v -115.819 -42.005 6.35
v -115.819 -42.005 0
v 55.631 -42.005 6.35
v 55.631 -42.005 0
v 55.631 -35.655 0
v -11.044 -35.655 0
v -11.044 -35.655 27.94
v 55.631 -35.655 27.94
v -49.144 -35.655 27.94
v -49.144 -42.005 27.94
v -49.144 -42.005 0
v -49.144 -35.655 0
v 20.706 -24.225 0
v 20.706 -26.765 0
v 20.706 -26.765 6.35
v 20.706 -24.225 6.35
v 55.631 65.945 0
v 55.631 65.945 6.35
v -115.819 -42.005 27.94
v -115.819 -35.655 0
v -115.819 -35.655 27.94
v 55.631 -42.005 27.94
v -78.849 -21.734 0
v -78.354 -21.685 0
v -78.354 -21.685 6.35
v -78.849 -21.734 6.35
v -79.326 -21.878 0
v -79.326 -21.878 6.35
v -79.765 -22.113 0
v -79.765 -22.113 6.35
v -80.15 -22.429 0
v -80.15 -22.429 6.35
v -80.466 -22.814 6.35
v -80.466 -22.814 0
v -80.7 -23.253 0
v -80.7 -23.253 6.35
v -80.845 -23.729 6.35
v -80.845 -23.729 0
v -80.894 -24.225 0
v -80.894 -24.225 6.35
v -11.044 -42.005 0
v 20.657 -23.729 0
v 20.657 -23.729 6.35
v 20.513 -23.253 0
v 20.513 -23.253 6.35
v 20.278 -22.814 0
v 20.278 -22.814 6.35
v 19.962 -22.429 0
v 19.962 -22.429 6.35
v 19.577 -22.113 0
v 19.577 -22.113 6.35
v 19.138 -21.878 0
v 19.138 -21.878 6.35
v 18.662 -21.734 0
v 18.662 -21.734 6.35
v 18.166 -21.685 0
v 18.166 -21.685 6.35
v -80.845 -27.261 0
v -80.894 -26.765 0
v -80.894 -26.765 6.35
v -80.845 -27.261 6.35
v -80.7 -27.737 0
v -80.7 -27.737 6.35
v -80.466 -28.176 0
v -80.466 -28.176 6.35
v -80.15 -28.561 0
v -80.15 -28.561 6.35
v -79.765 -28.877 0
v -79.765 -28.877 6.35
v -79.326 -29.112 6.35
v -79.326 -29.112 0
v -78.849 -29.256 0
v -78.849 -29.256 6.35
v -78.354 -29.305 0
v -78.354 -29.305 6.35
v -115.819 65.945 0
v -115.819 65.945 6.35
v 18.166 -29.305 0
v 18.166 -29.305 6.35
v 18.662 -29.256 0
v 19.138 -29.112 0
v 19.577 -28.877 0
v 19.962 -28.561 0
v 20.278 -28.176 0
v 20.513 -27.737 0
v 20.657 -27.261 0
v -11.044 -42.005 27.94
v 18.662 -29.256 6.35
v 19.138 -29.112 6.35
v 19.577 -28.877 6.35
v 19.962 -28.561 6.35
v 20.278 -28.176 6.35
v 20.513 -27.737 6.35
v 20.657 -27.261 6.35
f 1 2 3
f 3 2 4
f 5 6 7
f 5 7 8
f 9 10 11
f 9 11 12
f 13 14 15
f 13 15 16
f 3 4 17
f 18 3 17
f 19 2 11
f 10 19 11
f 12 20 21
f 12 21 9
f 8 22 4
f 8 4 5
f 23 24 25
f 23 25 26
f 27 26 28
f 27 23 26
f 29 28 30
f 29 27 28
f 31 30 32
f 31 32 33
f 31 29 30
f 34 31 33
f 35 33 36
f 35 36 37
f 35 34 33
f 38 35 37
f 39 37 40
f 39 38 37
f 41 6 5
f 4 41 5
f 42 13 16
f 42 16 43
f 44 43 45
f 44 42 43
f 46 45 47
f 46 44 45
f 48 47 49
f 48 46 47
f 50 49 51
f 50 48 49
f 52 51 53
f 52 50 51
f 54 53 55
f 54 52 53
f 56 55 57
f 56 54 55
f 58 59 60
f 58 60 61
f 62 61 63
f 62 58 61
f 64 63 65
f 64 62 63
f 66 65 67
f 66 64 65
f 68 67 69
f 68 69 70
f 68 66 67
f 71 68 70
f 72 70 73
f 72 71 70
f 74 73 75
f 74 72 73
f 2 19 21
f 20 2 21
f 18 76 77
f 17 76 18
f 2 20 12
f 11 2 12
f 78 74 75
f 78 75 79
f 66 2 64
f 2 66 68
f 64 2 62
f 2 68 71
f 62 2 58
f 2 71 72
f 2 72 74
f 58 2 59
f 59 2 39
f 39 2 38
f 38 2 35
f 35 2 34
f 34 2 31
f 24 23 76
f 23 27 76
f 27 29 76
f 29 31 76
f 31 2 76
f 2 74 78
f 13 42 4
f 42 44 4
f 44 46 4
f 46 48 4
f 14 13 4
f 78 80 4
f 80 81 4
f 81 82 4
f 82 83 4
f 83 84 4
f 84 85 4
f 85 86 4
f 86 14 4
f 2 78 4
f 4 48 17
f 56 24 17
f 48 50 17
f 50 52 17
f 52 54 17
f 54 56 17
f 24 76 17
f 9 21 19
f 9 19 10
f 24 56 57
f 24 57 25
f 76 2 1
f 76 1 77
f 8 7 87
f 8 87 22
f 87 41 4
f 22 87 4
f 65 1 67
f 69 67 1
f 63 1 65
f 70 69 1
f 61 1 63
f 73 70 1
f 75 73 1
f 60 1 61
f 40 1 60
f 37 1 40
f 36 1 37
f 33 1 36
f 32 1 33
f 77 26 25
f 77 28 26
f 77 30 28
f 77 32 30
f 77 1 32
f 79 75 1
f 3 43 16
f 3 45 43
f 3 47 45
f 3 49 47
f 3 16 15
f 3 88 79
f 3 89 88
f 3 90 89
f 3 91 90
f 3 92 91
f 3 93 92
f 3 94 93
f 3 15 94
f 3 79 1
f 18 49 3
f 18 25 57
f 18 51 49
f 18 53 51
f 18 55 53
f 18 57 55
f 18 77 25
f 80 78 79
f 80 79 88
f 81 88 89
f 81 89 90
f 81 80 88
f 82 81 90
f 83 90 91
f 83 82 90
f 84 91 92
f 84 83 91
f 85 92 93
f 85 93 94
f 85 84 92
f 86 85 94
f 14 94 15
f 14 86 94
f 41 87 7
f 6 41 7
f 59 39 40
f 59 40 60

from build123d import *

# Parameters (mm, degrees)
F2_W     = 66.675
F2_H     = 6.35
F3_DEPTH = 27.94
F0_W     = 171.45
F0_H     = 107.95
F4_DEPTH = 6.35
F5_DEPTH = 6.35


with BuildPart() as f3:
    # F2 (on face) → F3 (new body)
    with BuildSketch(Plane.XY):
        with Locations((-82.481257, -38.830014)):
            Rectangle(F2_W, F2_H)
        with Locations((22.293743, -38.830014)):
            Rectangle(F2_W, F2_H)
    extrude(amount=F3_DEPTH)


with BuildPart() as f4:
    # F0 (on Top) → F4 (new body)
    with BuildSketch(Plane.XY):
        with Locations((-30.093757, 11.969986)):
            Rectangle(F0_W, F0_H)
    extrude(amount=F4_DEPTH)

    # F1 (on Top) → F5 (cut)
    with BuildSketch(Plane.XY):
        with BuildLine():
            ThreePointArc((-80.893757, -26.765014), (-80.149809, -28.561065), (-78.353757, -29.305014))
            Line((-78.353757, -29.305014), (18.166243, -29.305014))
            ThreePointArc((18.166243, -29.305014), (19.962294, -28.561065), (20.706243, -26.765014))
            Line((20.706243, -26.765014), (20.706243, -24.225014))
            ThreePointArc((20.706243, -24.225014), (19.962294, -22.428962), (18.166243, -21.685014))
            Line((18.166243, -21.685014), (-78.353757, -21.685014))
            ThreePointArc((-78.353757, -21.685014), (-80.149809, -22.428962), (-80.893757, -24.225014))
            Line((-80.893757, -24.225014), (-80.893757, -26.765014))
        make_face()
    extrude(amount=F5_DEPTH, mode=Mode.SUBTRACT)


solid = Compound([f3.part, f4.part])
